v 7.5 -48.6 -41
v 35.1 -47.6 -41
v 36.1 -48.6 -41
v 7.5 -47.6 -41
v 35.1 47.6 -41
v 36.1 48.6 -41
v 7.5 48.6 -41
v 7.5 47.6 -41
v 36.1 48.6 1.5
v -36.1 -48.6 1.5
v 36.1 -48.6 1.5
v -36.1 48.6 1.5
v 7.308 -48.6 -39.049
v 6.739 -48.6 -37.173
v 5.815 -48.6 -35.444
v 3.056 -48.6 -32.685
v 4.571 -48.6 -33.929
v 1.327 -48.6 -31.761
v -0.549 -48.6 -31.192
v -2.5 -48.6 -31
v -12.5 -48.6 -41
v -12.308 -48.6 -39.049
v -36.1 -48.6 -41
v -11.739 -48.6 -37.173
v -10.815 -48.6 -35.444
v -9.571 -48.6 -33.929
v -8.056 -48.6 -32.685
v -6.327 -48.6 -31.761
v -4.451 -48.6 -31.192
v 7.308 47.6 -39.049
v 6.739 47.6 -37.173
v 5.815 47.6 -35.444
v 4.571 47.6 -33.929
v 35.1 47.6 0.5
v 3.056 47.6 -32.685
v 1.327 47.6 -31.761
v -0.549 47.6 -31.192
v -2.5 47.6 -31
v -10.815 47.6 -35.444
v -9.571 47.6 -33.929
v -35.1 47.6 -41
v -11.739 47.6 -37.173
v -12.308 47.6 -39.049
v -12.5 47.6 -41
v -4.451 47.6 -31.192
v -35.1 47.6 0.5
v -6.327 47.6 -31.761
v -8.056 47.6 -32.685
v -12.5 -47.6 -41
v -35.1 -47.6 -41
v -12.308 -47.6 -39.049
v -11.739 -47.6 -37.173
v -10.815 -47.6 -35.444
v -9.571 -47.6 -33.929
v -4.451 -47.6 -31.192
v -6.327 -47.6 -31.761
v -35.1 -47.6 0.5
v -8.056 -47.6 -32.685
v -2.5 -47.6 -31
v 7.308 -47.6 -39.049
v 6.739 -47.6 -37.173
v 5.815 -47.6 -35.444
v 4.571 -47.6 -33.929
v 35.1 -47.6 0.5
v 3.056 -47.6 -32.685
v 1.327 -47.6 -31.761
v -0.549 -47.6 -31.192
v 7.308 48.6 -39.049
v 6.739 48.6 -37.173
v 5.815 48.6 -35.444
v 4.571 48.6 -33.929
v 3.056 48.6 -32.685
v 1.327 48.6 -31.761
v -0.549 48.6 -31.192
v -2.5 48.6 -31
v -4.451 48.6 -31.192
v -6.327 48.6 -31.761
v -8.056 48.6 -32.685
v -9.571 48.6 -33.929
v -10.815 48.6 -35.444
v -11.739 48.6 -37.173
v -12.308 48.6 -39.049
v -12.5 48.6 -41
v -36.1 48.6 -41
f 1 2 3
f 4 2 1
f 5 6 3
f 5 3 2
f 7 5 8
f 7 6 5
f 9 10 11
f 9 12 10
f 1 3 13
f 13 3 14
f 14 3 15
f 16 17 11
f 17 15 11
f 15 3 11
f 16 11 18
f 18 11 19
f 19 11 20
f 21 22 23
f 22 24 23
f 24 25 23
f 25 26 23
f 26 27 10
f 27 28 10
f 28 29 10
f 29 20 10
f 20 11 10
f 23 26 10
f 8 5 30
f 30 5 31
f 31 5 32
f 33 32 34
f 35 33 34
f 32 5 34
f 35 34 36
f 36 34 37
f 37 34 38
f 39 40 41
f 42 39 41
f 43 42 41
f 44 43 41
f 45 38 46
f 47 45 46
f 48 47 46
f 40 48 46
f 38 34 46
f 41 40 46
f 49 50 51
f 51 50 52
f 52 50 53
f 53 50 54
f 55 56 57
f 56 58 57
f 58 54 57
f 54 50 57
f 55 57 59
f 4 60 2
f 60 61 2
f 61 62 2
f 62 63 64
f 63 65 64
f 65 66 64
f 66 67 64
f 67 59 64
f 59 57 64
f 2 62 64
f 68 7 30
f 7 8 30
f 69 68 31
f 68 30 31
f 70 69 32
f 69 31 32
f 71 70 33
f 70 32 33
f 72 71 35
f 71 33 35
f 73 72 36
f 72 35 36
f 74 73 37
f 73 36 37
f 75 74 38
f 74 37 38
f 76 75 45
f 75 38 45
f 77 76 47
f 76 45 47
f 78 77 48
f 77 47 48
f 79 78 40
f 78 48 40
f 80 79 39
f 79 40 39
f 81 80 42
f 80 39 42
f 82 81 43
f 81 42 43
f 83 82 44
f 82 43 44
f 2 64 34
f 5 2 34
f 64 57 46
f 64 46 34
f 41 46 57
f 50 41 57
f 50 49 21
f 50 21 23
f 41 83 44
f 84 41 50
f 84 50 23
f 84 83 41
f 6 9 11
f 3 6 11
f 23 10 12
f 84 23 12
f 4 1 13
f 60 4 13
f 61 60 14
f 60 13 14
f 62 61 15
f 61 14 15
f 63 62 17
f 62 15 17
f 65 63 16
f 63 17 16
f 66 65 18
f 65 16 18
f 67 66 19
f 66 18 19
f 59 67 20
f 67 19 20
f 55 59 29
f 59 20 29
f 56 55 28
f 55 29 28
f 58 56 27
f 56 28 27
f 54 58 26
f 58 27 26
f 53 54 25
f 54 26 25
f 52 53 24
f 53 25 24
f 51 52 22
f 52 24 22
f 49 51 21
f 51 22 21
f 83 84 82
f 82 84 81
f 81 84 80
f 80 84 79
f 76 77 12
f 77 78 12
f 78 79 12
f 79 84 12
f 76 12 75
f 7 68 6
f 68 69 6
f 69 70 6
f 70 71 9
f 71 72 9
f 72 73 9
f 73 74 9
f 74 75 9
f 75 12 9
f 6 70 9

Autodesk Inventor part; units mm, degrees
ref_plane "YZ Plane" through (0, 0, 0) normal (1, 0, 0) x (0, 1, 0)
ref_plane "Arbeitsebene1" through (0, 0, 0.5) normal (0, 0, 1) x (1, 0, 0)
sketch "Skizze1" plane through (0, 0, 0.5) normal (0, 0, 1) x (1, 0, 0)
  line L0 (-33.9, -46.4) -> (-33.9, 46.4) projected
  line L1 (-33.9, 46.4) -> (33.9, 46.4) projected
  line L2 (33.9, 46.4) -> (33.9, -46.4) projected
  line L3 (33.9, -46.4) -> (-33.9, -46.4) projected
  line L4 (35, 47.5) -> (-35, 47.5) projected
  line L5 (-35, 47.5) -> (-35, -47.5) projected
  line L6 (-35, -47.5) -> (35, -47.5) projected
  line L7 (35, -47.5) -> (35, 47.5) projected
  line L8 (-36.1, 48.6) -> (36.1, 48.6)
  line L9 (36.1, 48.6) -> (36.1, -48.6)
  line L10 (36.1, -48.6) -> (-36.1, -48.6)
  line L11 (-36.1, -48.6) -> (-36.1, 48.6)
  point P0 (0, 0)
  dimension "d0" = 1.1
extrude "Extrusion1" add sketch "Skizze1" along normal blind 1 contours L0 L1 L2 L3 | L7 L6 L5 L4 | L8 L9 L10 L11
sketch "Skizze2" plane through (0, 0, 0.5) normal (0, 0, -1) x (-1, 0, 0)
  line L0 (36.1, 48.6) -> (-36.1, 48.6) projected
  line L1 (-36.1, 48.6) -> (-36.1, -48.6) projected
  line L2 (-36.1, -48.6) -> (36.1, -48.6) projected
  line L3 (36.1, -48.6) -> (36.1, 48.6) projected
  line L4 (-35.1, 47.6) -> (35.1, 47.6)
  line L5 (35.1, 47.6) -> (35.1, -47.6)
  line L6 (35.1, -47.6) -> (-35.1, -47.6)
  line L7 (-35.1, -47.6) -> (-35.1, 47.6)
  point P0 (0, 0)
  dimension "d3" = 1
ref_plane "Arbeitsebene2" through (-34.54, -42.79, -40) normal (0, 0, 1) x (1, 0, 0)
ref_plane "Arbeitsebene3" through (-32.5, -40, -41) normal (0, 0, -1) x (0, 1, 0)
extrude "Extrusion2" add sketch "Skizze2" along normal up to surface (41.5 mm away)
sketch "Skizze3" plane through (-36.1, -48.6, 1.5) normal (0, -1, 0) x (1, 0, 0)
  line L0 (0, -42.5) -> (72.2, -42.5) projected
  line L1 (33.6, -45.4928) -> (33.6, 6) construction
  circle A0 centre (33.6, -42.5) radius 10
  point P0 (36.1, -1.5)
  dimension "d6" = 20
extrude "Extrusion3" cut sketch "Skizze3" against normal up to surface (97.2 mm away)
properties part number "Deckel"
